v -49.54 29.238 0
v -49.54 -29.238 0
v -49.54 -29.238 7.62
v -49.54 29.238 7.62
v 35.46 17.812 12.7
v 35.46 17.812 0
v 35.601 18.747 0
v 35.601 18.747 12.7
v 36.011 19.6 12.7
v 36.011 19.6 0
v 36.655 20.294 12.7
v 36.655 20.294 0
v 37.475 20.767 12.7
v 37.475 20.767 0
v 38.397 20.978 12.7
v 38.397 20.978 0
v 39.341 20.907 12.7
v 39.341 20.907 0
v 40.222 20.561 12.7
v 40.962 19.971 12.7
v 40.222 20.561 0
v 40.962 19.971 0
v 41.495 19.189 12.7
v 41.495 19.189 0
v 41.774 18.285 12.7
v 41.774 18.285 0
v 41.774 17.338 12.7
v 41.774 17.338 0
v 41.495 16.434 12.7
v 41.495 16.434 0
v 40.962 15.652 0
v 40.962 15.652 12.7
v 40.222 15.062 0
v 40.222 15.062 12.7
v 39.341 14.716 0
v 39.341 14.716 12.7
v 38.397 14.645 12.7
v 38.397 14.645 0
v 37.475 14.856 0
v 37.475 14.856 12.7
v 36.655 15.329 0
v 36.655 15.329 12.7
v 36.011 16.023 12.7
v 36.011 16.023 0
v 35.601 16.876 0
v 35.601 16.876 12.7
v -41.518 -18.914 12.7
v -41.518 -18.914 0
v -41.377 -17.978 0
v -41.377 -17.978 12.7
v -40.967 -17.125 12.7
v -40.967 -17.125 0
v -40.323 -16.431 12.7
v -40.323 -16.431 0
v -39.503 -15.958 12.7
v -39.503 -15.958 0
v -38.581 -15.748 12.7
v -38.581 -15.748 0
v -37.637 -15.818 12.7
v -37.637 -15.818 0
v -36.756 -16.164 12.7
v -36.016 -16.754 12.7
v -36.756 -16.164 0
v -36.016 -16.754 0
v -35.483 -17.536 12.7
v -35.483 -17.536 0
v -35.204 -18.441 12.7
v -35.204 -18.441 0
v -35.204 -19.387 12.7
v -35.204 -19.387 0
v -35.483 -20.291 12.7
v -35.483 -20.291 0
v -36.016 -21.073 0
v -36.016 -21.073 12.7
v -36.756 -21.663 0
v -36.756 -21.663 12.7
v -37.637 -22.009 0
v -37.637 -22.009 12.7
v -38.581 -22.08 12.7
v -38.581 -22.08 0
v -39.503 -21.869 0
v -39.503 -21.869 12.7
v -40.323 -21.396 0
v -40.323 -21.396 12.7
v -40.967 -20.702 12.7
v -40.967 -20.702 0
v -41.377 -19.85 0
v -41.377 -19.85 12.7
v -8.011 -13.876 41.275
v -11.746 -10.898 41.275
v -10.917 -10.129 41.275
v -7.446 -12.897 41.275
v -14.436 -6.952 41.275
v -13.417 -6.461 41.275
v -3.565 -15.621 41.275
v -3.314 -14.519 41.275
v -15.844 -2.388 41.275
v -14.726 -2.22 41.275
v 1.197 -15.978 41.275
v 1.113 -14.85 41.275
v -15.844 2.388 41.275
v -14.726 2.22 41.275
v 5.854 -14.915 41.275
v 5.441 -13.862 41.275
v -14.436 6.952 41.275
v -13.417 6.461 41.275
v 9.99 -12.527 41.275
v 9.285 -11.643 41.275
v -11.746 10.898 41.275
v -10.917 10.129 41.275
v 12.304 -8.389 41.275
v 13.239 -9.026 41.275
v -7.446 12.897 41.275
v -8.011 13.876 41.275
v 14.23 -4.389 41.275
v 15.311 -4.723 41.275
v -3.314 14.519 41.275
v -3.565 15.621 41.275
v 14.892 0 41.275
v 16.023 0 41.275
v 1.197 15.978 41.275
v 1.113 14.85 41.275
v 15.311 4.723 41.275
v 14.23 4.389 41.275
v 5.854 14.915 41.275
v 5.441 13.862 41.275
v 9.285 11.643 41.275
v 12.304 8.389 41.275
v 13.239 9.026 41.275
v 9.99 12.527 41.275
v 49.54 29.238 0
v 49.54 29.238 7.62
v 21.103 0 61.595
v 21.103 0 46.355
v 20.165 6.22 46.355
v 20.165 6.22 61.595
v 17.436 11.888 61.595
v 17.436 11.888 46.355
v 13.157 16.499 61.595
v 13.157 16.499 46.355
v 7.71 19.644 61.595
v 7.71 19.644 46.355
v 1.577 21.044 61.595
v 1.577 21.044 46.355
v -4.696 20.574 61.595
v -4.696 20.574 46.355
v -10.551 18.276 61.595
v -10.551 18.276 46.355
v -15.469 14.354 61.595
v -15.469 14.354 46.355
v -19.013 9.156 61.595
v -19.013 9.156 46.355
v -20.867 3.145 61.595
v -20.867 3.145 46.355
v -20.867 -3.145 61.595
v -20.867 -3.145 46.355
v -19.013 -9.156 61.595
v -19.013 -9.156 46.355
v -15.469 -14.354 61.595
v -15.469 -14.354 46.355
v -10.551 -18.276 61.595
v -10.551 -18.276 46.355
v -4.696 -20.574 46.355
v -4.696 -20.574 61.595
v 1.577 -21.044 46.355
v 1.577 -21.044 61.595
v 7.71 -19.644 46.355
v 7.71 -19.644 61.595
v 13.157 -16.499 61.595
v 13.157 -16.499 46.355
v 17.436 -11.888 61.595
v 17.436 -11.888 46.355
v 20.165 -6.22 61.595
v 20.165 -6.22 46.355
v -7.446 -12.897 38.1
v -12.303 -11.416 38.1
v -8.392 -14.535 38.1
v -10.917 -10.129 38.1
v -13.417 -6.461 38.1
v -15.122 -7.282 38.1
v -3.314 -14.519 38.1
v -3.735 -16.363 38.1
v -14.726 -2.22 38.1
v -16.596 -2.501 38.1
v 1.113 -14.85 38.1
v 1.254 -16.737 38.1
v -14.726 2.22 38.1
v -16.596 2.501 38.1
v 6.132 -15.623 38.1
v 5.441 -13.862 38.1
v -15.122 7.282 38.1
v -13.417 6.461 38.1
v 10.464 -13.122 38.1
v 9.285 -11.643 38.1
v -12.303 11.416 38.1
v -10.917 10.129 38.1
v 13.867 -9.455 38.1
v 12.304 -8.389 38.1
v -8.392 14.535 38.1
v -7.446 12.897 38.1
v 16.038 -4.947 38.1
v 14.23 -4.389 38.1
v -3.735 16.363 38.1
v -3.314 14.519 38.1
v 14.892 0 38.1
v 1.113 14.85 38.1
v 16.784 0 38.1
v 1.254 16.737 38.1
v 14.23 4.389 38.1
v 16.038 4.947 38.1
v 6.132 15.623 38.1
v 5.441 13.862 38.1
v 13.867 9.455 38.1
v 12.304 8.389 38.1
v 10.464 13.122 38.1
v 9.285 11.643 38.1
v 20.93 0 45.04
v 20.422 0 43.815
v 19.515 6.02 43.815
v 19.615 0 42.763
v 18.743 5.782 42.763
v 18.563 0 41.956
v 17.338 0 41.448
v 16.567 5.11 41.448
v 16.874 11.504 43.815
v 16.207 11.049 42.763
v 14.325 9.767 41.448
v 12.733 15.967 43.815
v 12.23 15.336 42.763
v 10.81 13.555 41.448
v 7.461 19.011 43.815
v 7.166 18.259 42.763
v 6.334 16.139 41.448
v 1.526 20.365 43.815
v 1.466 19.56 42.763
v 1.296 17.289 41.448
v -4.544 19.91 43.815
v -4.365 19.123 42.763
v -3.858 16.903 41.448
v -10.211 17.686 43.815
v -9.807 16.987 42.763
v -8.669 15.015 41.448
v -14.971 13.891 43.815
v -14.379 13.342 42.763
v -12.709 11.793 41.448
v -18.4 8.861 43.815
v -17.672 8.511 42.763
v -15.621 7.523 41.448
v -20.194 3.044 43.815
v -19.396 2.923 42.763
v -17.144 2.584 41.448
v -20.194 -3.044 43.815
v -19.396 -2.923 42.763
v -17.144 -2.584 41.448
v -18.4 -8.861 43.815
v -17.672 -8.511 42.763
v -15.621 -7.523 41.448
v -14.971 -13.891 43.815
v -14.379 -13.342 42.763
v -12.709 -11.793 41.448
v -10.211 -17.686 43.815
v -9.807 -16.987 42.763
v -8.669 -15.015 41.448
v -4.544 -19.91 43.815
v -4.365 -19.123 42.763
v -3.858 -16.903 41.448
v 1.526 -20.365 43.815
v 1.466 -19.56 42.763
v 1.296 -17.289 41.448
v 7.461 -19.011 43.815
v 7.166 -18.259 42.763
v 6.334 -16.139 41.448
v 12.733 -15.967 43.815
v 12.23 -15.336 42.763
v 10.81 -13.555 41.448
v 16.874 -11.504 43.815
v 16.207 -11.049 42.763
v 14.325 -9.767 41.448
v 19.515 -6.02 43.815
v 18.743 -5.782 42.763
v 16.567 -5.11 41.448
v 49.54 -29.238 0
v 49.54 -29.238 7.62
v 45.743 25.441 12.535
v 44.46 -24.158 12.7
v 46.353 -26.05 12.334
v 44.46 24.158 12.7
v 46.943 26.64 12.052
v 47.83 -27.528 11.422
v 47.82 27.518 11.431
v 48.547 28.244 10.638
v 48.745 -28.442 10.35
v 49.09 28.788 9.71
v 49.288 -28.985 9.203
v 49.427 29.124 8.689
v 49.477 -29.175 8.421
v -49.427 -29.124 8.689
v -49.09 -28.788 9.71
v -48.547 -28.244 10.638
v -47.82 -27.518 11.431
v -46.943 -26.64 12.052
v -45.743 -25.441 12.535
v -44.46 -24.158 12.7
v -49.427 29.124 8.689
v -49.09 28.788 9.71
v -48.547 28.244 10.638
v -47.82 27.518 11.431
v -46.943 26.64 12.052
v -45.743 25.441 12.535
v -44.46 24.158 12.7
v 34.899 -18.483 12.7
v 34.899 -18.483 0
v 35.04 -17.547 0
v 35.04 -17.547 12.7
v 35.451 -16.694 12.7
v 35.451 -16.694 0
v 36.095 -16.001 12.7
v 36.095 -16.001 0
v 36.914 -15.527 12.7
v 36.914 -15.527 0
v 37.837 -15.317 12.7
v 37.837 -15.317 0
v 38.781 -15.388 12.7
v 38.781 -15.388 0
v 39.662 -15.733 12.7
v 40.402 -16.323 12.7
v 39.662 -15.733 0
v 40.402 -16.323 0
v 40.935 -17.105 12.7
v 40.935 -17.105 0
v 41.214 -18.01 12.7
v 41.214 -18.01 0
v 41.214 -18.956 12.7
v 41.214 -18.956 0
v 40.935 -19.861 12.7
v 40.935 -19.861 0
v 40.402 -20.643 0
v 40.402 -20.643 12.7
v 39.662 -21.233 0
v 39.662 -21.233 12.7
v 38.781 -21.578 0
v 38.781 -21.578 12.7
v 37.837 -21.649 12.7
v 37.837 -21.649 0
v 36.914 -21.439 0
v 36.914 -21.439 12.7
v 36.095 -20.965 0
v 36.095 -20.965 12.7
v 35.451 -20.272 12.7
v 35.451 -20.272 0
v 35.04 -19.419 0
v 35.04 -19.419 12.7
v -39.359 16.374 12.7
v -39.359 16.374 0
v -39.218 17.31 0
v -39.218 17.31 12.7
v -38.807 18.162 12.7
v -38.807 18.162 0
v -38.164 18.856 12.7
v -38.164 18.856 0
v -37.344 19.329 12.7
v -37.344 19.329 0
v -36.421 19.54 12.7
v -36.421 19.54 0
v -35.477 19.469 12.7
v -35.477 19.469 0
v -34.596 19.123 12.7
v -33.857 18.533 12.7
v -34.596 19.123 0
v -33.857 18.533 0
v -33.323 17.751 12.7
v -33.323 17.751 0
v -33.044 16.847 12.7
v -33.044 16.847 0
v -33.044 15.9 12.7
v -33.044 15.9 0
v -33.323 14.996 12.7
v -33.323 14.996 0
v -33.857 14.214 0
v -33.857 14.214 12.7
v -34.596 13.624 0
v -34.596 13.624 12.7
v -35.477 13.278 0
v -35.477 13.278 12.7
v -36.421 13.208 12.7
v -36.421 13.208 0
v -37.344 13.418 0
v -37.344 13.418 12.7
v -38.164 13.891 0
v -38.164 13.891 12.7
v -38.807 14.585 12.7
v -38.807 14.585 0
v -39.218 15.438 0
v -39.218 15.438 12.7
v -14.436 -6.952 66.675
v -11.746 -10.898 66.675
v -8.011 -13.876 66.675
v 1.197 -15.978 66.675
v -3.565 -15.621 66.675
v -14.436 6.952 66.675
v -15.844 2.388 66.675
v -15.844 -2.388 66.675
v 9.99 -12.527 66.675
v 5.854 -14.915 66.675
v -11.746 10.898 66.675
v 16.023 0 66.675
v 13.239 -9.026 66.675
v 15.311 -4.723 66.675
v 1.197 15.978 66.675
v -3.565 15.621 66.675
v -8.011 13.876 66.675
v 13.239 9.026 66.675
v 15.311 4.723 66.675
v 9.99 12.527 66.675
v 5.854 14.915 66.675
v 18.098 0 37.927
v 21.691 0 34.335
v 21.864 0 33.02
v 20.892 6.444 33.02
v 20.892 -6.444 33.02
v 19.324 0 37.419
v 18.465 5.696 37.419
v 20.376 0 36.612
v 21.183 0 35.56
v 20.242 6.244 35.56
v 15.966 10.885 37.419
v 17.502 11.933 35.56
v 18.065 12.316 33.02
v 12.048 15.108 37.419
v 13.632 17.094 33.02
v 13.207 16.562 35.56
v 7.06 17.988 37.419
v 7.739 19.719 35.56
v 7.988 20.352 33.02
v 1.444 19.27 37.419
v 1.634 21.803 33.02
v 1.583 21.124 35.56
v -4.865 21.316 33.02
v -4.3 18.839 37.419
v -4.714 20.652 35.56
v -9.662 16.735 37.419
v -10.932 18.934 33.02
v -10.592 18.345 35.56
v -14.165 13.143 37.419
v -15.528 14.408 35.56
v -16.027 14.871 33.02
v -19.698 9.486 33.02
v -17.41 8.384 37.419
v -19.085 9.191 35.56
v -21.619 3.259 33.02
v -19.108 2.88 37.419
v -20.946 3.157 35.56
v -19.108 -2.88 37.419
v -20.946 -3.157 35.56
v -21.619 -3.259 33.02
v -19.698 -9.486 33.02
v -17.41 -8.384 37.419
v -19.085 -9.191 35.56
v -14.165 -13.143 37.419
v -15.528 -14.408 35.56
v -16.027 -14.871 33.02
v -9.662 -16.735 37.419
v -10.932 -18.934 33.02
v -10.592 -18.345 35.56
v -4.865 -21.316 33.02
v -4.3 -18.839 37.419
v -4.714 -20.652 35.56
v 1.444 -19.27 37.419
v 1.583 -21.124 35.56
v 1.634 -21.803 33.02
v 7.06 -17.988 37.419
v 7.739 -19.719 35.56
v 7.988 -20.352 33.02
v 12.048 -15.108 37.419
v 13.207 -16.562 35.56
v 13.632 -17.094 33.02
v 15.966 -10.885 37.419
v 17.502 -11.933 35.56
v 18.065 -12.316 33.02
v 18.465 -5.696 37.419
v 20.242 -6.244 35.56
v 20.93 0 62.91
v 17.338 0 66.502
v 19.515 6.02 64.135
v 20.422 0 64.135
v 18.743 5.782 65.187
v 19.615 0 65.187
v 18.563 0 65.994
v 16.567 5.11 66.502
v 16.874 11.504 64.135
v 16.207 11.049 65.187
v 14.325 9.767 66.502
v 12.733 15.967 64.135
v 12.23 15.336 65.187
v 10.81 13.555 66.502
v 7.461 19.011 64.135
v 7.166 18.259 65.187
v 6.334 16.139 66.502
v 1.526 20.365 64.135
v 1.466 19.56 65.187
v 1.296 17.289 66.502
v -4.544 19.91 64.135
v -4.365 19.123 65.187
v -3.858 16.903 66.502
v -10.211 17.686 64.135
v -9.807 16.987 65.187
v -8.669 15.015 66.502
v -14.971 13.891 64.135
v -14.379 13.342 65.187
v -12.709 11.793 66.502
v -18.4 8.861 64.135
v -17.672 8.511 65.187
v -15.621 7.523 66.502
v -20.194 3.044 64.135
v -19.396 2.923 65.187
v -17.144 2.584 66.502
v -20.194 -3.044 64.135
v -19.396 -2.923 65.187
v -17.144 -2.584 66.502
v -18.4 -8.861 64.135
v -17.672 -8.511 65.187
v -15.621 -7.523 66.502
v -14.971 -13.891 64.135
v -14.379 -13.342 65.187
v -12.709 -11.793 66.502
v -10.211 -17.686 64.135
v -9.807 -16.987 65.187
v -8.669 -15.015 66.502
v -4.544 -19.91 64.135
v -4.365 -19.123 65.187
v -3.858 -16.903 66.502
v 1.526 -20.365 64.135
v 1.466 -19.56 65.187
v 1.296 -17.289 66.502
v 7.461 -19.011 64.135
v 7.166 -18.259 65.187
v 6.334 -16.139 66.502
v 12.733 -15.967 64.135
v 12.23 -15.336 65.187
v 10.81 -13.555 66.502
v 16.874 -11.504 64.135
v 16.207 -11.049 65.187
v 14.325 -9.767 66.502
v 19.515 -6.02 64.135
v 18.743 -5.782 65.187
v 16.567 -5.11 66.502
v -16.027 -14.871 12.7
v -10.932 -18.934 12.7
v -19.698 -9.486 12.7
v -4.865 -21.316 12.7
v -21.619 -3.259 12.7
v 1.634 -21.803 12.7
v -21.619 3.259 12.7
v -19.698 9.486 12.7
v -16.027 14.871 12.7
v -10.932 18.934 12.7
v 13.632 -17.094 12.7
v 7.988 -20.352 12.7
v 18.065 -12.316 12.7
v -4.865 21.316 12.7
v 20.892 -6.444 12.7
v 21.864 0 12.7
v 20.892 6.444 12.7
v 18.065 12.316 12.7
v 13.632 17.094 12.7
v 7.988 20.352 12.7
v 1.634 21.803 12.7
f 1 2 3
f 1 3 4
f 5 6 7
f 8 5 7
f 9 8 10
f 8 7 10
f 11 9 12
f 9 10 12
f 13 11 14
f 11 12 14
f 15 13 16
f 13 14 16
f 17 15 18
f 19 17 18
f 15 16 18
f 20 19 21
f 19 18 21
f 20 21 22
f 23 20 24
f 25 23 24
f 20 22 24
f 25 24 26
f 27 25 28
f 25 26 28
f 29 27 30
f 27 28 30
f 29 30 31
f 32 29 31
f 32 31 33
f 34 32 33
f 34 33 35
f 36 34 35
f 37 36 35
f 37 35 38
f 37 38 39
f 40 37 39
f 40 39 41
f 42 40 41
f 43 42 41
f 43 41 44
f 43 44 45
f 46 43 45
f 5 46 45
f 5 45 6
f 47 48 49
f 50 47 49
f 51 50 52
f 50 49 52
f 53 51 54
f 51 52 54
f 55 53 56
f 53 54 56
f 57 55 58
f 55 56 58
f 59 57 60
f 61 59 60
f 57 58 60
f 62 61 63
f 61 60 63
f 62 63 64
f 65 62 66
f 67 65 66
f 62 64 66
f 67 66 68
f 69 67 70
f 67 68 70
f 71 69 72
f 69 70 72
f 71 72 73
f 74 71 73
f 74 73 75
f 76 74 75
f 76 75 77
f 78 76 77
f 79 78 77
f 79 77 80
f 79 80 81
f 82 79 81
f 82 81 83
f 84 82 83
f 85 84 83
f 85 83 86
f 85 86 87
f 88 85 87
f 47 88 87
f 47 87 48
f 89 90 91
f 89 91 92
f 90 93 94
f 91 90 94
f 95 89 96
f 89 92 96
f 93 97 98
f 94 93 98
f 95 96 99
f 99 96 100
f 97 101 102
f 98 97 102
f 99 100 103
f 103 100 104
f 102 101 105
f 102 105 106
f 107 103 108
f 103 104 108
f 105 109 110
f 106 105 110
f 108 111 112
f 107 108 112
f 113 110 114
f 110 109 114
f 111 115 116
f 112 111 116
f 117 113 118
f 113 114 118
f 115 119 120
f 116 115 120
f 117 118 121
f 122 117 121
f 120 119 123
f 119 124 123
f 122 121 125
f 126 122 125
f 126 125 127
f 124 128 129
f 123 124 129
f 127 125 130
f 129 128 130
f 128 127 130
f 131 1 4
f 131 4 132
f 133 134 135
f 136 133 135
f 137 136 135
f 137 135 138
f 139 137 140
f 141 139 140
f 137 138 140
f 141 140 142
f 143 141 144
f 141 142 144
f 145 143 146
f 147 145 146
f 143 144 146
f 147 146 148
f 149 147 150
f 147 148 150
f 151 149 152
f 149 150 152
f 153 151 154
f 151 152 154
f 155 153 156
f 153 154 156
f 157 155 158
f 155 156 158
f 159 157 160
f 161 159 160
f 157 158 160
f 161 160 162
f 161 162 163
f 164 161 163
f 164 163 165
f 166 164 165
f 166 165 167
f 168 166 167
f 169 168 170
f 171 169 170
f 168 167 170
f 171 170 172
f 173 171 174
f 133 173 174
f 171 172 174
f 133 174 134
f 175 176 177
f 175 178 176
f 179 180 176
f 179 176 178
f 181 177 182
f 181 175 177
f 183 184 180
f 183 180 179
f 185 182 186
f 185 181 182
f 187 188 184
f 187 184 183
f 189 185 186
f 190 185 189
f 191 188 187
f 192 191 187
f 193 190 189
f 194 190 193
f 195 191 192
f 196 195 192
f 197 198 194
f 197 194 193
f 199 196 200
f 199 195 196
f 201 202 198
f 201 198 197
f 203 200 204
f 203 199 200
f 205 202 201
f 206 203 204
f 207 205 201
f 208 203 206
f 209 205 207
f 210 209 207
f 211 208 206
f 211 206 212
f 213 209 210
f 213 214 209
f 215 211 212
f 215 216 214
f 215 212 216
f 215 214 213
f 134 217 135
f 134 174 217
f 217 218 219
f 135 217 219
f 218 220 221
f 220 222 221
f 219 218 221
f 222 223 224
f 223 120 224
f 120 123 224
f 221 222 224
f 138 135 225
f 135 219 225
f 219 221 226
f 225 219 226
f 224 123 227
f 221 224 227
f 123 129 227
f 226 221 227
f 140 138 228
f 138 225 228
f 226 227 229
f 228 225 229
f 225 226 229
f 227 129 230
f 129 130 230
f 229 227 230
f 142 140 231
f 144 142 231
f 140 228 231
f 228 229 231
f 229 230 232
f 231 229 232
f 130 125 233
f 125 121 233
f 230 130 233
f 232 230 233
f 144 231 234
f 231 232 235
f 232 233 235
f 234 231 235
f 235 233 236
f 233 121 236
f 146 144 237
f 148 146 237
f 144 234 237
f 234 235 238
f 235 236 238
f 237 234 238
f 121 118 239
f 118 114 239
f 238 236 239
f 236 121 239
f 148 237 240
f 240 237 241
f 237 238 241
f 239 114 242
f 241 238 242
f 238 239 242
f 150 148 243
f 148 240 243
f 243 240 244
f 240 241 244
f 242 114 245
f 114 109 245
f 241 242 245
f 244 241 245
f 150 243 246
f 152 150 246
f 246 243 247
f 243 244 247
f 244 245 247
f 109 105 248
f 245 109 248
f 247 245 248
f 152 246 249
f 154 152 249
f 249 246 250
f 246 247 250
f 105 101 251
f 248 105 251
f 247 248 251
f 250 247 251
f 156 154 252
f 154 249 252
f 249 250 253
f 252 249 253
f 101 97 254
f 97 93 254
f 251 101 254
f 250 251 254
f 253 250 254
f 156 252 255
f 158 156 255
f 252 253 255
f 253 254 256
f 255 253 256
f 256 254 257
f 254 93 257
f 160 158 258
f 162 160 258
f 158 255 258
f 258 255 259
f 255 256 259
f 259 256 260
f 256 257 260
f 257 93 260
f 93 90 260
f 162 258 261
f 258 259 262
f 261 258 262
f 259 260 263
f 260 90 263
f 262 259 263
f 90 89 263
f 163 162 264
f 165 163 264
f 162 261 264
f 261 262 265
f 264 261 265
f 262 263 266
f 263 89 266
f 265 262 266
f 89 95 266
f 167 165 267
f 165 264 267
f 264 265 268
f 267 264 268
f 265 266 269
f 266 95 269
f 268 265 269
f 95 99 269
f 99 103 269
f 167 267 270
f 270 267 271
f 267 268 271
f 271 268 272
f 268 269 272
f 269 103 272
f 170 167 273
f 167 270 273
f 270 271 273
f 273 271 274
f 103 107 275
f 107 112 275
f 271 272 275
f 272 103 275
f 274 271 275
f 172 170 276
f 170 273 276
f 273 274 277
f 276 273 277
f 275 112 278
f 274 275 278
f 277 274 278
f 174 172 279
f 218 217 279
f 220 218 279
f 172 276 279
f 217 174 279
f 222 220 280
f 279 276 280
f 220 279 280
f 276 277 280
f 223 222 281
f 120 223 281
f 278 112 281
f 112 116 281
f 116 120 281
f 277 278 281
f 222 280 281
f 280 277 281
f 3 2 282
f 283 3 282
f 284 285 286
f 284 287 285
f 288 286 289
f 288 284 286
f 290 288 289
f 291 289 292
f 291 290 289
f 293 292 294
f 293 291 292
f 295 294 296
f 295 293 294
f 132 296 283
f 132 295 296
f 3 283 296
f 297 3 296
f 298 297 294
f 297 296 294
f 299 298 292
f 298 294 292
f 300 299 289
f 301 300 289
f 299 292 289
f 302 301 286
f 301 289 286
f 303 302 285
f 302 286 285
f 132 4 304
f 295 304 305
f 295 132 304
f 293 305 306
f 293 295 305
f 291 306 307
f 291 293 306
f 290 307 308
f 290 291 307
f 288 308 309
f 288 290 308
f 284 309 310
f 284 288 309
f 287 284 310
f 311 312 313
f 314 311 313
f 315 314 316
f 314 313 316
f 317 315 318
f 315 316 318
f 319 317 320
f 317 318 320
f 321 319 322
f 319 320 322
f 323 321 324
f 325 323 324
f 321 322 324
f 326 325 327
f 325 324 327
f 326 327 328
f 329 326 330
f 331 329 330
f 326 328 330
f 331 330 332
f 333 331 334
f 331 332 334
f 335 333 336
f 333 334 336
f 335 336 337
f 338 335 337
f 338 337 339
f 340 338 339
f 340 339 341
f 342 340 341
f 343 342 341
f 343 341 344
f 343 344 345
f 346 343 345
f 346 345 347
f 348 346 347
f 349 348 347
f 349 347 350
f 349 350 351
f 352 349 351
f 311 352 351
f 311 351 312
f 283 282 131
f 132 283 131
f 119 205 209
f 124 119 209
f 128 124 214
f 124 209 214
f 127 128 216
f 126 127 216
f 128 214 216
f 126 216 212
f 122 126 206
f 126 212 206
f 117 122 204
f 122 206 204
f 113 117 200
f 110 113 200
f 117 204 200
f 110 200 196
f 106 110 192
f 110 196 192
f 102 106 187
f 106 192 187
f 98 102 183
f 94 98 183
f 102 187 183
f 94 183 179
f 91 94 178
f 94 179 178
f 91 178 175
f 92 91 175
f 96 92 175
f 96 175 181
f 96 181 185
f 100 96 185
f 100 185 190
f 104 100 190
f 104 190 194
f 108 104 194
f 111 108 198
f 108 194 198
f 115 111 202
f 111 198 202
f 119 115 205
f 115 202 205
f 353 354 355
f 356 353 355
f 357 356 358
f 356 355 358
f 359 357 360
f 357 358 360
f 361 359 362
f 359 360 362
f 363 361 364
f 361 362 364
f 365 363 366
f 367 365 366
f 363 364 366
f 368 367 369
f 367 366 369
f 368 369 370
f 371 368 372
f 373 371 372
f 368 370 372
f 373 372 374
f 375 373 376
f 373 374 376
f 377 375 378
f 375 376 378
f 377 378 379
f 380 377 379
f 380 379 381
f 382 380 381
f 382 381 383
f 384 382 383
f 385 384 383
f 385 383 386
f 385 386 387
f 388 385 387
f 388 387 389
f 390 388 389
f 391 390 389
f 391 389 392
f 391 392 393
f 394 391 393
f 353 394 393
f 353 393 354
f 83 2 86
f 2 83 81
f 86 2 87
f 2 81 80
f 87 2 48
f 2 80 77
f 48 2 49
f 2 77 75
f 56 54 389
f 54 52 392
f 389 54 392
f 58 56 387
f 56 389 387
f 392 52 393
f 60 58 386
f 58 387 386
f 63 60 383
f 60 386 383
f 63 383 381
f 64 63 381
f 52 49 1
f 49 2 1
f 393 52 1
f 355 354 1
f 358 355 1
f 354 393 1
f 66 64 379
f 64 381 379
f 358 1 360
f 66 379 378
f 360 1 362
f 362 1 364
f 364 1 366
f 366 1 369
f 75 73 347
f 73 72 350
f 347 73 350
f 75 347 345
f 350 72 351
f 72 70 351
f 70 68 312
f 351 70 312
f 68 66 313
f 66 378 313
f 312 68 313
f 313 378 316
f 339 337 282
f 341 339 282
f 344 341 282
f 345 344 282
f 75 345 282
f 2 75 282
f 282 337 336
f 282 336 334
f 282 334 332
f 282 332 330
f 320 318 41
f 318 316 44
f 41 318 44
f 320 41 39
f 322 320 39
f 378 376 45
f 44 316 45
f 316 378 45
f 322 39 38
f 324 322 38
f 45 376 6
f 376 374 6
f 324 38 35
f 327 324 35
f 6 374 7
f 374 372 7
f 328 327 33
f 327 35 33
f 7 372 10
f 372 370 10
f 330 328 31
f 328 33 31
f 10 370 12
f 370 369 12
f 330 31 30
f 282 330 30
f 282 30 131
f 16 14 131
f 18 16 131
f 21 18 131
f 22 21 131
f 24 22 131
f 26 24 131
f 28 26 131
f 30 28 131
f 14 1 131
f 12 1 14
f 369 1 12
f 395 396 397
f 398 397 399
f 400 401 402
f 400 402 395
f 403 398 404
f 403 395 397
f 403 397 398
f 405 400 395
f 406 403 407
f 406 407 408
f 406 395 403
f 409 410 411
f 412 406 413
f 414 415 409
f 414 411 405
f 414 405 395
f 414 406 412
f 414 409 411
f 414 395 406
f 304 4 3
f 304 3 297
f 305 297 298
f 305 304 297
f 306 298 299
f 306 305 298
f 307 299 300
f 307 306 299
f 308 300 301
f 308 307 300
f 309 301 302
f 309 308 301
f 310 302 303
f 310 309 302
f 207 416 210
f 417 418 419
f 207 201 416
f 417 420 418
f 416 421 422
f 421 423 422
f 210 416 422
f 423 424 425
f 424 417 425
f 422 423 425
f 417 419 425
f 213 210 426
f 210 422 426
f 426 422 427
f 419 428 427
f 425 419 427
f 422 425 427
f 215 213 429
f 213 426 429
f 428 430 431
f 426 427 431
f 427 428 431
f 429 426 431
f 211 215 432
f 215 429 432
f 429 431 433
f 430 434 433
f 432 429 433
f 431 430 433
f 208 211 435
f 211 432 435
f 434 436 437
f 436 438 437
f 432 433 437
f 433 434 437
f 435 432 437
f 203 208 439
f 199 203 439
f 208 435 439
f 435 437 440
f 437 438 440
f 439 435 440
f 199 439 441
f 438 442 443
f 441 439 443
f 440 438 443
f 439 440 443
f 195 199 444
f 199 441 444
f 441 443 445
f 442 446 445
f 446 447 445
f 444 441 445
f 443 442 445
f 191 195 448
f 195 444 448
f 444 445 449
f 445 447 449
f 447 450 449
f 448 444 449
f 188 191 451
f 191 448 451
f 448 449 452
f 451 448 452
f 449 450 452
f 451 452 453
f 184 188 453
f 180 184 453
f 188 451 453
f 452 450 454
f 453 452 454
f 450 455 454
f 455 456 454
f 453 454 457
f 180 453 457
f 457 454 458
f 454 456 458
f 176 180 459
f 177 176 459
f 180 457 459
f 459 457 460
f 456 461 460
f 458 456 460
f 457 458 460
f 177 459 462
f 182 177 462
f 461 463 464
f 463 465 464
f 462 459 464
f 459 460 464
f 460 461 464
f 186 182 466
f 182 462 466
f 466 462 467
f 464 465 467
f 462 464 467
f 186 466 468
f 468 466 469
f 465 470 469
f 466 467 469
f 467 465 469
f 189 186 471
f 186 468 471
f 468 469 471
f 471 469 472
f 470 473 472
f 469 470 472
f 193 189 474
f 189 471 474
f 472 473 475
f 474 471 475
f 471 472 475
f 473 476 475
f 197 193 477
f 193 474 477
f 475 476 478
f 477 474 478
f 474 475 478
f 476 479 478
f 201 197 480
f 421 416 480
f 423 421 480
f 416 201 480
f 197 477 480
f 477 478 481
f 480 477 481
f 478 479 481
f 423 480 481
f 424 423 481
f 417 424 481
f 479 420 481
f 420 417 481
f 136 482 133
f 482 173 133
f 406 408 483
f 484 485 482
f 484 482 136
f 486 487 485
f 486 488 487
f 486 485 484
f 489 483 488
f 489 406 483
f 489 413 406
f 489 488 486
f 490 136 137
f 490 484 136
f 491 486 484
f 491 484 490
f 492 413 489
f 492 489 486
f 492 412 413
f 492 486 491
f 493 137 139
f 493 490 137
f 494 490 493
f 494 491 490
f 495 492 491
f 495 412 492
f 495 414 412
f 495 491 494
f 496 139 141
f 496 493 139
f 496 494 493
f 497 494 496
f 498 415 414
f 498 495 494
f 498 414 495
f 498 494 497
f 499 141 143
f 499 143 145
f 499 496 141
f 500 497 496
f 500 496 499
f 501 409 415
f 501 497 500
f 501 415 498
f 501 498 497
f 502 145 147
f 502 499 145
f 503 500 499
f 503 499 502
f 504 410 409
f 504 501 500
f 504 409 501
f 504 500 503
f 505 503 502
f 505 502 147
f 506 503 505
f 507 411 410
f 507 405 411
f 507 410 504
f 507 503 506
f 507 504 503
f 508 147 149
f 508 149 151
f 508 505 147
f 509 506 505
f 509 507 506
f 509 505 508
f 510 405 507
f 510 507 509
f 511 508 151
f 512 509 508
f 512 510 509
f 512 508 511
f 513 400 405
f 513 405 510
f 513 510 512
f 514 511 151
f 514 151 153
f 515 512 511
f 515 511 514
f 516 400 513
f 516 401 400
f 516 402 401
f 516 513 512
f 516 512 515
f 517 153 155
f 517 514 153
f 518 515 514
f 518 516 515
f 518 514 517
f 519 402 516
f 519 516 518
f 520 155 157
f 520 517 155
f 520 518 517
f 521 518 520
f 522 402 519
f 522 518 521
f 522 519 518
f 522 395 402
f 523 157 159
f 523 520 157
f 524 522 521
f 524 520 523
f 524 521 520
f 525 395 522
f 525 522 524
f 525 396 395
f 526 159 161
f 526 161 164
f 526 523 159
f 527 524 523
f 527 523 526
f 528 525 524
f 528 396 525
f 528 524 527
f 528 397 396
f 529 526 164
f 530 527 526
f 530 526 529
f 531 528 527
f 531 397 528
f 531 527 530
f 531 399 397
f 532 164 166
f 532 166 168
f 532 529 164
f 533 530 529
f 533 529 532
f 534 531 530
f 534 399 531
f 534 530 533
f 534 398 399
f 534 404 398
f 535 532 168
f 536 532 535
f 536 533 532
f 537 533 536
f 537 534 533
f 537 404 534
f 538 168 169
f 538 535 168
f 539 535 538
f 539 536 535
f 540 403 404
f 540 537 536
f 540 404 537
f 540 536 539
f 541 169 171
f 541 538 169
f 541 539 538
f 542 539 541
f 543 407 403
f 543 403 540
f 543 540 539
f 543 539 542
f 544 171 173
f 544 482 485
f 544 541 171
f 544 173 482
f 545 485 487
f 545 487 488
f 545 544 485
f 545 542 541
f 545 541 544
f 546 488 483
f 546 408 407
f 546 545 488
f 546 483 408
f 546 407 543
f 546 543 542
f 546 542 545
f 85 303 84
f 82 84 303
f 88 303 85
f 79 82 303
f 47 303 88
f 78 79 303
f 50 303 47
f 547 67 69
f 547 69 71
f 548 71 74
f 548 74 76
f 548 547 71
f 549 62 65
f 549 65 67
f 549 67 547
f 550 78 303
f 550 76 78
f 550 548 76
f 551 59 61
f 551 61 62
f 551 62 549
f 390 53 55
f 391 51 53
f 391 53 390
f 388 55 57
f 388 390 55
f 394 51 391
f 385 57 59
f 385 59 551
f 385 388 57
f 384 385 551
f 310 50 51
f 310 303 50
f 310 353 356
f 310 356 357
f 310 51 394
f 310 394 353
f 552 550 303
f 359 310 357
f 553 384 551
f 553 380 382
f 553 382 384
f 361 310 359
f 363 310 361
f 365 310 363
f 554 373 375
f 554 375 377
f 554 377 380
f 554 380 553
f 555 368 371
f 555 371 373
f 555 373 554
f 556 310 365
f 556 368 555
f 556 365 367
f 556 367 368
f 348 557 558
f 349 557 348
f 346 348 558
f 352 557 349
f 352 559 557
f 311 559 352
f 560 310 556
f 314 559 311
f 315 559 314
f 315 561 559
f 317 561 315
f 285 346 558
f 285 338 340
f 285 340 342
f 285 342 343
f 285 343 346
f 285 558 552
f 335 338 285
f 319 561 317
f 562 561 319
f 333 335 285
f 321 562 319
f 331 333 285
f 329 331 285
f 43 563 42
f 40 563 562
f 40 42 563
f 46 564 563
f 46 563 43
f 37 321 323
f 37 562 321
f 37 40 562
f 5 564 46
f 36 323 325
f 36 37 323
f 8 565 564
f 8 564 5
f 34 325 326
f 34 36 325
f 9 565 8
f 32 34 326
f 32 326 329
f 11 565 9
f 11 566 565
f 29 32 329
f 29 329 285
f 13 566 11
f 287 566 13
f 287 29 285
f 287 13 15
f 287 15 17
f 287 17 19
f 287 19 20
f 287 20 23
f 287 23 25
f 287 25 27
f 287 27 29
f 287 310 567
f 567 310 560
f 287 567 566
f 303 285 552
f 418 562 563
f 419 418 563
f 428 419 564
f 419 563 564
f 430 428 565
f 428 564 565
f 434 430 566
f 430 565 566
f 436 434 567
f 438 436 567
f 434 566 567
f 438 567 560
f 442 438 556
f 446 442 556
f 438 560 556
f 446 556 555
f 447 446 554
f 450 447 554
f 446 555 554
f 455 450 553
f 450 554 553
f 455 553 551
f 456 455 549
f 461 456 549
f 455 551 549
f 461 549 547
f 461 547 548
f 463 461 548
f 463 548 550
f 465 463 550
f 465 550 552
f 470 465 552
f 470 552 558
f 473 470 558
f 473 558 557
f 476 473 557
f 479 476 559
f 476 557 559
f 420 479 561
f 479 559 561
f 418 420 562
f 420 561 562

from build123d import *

# Parameters (mm, degrees)
F0_W     = 99.0809351206
F0_H     = 58.4763474762
F0_R     = 16.3683146095
F1_DEPTH = 12.7
F2_R     = 21.8636685636
F3_DEPTH = 25.4
F4_R     = 5.08
F5_R     = 14.8918944932
F6_DEPTH = 3.175
F7_R     = 21.1028142618
F7_R_2   = 14.8918944932
F8_DEPTH = 25.4
F9_R     = 5.08
F11_D    = 6.35
F12_R    = 5.08


with BuildPart() as f1:
    # F0 (on Top) → F1 (new body)
    with BuildSketch(Plane.XY):
        Rectangle(F0_W, F0_H)
        Circle(F0_R, mode=Mode.SUBTRACT)
        Circle(F0_R)
    extrude(amount=F1_DEPTH)

    # F2 (on face) → F3 (join)
    with BuildSketch(Plane.XY.offset(12.7)):
        Circle(F2_R)
    extrude(amount=F3_DEPTH)

    # F4
    f4_edges = [f1.edges().sort_by_distance(p)[0] for p in [
        (0, 29.238174, 12.7),
        (49.540468, 0, 12.7),
        (0, -29.238174, 12.7),
        (-49.540468, 0, 12.7),
    ]]
    fillet(f4_edges, radius=F4_R)

    # F5 (on face) → F6 (join)
    with BuildSketch(Plane.XY.offset(38.1)):
        Circle(F5_R)
    extrude(amount=F6_DEPTH)

    # F7 (on face) → F8 (join)
    with BuildSketch(Plane.XY.offset(41.275)):
        Circle(F7_R)
        Circle(F7_R_2, mode=Mode.SUBTRACT)
        Circle(F7_R_2)
    extrude(amount=F8_DEPTH)

    # F9
    f9_edges = [f1.edges().sort_by_distance(p)[0] for p in [
        (-21.102814, 0, 41.275),
        (-21.863669, 0, 38.1),
    ]]
    fillet(f9_edges, radius=F9_R)

    # F11 (through all)
    with Locations(Plane.XY.offset(12.7)):
        with Locations((38.6345759034, 17.8116075695), (38.0743406713, -18.4829942882), (-36.1839905381, 16.3736771792), (-38.3434481919, -18.9137440175)):
            Hole(F11_D / 2)

    # F12
    f12_edges = [f1.edges().sort_by_distance(p)[0] for p in [
        (-21.102814, 0, 66.675),
    ]]
    fillet(f12_edges, radius=F12_R)


solid = f1.part
